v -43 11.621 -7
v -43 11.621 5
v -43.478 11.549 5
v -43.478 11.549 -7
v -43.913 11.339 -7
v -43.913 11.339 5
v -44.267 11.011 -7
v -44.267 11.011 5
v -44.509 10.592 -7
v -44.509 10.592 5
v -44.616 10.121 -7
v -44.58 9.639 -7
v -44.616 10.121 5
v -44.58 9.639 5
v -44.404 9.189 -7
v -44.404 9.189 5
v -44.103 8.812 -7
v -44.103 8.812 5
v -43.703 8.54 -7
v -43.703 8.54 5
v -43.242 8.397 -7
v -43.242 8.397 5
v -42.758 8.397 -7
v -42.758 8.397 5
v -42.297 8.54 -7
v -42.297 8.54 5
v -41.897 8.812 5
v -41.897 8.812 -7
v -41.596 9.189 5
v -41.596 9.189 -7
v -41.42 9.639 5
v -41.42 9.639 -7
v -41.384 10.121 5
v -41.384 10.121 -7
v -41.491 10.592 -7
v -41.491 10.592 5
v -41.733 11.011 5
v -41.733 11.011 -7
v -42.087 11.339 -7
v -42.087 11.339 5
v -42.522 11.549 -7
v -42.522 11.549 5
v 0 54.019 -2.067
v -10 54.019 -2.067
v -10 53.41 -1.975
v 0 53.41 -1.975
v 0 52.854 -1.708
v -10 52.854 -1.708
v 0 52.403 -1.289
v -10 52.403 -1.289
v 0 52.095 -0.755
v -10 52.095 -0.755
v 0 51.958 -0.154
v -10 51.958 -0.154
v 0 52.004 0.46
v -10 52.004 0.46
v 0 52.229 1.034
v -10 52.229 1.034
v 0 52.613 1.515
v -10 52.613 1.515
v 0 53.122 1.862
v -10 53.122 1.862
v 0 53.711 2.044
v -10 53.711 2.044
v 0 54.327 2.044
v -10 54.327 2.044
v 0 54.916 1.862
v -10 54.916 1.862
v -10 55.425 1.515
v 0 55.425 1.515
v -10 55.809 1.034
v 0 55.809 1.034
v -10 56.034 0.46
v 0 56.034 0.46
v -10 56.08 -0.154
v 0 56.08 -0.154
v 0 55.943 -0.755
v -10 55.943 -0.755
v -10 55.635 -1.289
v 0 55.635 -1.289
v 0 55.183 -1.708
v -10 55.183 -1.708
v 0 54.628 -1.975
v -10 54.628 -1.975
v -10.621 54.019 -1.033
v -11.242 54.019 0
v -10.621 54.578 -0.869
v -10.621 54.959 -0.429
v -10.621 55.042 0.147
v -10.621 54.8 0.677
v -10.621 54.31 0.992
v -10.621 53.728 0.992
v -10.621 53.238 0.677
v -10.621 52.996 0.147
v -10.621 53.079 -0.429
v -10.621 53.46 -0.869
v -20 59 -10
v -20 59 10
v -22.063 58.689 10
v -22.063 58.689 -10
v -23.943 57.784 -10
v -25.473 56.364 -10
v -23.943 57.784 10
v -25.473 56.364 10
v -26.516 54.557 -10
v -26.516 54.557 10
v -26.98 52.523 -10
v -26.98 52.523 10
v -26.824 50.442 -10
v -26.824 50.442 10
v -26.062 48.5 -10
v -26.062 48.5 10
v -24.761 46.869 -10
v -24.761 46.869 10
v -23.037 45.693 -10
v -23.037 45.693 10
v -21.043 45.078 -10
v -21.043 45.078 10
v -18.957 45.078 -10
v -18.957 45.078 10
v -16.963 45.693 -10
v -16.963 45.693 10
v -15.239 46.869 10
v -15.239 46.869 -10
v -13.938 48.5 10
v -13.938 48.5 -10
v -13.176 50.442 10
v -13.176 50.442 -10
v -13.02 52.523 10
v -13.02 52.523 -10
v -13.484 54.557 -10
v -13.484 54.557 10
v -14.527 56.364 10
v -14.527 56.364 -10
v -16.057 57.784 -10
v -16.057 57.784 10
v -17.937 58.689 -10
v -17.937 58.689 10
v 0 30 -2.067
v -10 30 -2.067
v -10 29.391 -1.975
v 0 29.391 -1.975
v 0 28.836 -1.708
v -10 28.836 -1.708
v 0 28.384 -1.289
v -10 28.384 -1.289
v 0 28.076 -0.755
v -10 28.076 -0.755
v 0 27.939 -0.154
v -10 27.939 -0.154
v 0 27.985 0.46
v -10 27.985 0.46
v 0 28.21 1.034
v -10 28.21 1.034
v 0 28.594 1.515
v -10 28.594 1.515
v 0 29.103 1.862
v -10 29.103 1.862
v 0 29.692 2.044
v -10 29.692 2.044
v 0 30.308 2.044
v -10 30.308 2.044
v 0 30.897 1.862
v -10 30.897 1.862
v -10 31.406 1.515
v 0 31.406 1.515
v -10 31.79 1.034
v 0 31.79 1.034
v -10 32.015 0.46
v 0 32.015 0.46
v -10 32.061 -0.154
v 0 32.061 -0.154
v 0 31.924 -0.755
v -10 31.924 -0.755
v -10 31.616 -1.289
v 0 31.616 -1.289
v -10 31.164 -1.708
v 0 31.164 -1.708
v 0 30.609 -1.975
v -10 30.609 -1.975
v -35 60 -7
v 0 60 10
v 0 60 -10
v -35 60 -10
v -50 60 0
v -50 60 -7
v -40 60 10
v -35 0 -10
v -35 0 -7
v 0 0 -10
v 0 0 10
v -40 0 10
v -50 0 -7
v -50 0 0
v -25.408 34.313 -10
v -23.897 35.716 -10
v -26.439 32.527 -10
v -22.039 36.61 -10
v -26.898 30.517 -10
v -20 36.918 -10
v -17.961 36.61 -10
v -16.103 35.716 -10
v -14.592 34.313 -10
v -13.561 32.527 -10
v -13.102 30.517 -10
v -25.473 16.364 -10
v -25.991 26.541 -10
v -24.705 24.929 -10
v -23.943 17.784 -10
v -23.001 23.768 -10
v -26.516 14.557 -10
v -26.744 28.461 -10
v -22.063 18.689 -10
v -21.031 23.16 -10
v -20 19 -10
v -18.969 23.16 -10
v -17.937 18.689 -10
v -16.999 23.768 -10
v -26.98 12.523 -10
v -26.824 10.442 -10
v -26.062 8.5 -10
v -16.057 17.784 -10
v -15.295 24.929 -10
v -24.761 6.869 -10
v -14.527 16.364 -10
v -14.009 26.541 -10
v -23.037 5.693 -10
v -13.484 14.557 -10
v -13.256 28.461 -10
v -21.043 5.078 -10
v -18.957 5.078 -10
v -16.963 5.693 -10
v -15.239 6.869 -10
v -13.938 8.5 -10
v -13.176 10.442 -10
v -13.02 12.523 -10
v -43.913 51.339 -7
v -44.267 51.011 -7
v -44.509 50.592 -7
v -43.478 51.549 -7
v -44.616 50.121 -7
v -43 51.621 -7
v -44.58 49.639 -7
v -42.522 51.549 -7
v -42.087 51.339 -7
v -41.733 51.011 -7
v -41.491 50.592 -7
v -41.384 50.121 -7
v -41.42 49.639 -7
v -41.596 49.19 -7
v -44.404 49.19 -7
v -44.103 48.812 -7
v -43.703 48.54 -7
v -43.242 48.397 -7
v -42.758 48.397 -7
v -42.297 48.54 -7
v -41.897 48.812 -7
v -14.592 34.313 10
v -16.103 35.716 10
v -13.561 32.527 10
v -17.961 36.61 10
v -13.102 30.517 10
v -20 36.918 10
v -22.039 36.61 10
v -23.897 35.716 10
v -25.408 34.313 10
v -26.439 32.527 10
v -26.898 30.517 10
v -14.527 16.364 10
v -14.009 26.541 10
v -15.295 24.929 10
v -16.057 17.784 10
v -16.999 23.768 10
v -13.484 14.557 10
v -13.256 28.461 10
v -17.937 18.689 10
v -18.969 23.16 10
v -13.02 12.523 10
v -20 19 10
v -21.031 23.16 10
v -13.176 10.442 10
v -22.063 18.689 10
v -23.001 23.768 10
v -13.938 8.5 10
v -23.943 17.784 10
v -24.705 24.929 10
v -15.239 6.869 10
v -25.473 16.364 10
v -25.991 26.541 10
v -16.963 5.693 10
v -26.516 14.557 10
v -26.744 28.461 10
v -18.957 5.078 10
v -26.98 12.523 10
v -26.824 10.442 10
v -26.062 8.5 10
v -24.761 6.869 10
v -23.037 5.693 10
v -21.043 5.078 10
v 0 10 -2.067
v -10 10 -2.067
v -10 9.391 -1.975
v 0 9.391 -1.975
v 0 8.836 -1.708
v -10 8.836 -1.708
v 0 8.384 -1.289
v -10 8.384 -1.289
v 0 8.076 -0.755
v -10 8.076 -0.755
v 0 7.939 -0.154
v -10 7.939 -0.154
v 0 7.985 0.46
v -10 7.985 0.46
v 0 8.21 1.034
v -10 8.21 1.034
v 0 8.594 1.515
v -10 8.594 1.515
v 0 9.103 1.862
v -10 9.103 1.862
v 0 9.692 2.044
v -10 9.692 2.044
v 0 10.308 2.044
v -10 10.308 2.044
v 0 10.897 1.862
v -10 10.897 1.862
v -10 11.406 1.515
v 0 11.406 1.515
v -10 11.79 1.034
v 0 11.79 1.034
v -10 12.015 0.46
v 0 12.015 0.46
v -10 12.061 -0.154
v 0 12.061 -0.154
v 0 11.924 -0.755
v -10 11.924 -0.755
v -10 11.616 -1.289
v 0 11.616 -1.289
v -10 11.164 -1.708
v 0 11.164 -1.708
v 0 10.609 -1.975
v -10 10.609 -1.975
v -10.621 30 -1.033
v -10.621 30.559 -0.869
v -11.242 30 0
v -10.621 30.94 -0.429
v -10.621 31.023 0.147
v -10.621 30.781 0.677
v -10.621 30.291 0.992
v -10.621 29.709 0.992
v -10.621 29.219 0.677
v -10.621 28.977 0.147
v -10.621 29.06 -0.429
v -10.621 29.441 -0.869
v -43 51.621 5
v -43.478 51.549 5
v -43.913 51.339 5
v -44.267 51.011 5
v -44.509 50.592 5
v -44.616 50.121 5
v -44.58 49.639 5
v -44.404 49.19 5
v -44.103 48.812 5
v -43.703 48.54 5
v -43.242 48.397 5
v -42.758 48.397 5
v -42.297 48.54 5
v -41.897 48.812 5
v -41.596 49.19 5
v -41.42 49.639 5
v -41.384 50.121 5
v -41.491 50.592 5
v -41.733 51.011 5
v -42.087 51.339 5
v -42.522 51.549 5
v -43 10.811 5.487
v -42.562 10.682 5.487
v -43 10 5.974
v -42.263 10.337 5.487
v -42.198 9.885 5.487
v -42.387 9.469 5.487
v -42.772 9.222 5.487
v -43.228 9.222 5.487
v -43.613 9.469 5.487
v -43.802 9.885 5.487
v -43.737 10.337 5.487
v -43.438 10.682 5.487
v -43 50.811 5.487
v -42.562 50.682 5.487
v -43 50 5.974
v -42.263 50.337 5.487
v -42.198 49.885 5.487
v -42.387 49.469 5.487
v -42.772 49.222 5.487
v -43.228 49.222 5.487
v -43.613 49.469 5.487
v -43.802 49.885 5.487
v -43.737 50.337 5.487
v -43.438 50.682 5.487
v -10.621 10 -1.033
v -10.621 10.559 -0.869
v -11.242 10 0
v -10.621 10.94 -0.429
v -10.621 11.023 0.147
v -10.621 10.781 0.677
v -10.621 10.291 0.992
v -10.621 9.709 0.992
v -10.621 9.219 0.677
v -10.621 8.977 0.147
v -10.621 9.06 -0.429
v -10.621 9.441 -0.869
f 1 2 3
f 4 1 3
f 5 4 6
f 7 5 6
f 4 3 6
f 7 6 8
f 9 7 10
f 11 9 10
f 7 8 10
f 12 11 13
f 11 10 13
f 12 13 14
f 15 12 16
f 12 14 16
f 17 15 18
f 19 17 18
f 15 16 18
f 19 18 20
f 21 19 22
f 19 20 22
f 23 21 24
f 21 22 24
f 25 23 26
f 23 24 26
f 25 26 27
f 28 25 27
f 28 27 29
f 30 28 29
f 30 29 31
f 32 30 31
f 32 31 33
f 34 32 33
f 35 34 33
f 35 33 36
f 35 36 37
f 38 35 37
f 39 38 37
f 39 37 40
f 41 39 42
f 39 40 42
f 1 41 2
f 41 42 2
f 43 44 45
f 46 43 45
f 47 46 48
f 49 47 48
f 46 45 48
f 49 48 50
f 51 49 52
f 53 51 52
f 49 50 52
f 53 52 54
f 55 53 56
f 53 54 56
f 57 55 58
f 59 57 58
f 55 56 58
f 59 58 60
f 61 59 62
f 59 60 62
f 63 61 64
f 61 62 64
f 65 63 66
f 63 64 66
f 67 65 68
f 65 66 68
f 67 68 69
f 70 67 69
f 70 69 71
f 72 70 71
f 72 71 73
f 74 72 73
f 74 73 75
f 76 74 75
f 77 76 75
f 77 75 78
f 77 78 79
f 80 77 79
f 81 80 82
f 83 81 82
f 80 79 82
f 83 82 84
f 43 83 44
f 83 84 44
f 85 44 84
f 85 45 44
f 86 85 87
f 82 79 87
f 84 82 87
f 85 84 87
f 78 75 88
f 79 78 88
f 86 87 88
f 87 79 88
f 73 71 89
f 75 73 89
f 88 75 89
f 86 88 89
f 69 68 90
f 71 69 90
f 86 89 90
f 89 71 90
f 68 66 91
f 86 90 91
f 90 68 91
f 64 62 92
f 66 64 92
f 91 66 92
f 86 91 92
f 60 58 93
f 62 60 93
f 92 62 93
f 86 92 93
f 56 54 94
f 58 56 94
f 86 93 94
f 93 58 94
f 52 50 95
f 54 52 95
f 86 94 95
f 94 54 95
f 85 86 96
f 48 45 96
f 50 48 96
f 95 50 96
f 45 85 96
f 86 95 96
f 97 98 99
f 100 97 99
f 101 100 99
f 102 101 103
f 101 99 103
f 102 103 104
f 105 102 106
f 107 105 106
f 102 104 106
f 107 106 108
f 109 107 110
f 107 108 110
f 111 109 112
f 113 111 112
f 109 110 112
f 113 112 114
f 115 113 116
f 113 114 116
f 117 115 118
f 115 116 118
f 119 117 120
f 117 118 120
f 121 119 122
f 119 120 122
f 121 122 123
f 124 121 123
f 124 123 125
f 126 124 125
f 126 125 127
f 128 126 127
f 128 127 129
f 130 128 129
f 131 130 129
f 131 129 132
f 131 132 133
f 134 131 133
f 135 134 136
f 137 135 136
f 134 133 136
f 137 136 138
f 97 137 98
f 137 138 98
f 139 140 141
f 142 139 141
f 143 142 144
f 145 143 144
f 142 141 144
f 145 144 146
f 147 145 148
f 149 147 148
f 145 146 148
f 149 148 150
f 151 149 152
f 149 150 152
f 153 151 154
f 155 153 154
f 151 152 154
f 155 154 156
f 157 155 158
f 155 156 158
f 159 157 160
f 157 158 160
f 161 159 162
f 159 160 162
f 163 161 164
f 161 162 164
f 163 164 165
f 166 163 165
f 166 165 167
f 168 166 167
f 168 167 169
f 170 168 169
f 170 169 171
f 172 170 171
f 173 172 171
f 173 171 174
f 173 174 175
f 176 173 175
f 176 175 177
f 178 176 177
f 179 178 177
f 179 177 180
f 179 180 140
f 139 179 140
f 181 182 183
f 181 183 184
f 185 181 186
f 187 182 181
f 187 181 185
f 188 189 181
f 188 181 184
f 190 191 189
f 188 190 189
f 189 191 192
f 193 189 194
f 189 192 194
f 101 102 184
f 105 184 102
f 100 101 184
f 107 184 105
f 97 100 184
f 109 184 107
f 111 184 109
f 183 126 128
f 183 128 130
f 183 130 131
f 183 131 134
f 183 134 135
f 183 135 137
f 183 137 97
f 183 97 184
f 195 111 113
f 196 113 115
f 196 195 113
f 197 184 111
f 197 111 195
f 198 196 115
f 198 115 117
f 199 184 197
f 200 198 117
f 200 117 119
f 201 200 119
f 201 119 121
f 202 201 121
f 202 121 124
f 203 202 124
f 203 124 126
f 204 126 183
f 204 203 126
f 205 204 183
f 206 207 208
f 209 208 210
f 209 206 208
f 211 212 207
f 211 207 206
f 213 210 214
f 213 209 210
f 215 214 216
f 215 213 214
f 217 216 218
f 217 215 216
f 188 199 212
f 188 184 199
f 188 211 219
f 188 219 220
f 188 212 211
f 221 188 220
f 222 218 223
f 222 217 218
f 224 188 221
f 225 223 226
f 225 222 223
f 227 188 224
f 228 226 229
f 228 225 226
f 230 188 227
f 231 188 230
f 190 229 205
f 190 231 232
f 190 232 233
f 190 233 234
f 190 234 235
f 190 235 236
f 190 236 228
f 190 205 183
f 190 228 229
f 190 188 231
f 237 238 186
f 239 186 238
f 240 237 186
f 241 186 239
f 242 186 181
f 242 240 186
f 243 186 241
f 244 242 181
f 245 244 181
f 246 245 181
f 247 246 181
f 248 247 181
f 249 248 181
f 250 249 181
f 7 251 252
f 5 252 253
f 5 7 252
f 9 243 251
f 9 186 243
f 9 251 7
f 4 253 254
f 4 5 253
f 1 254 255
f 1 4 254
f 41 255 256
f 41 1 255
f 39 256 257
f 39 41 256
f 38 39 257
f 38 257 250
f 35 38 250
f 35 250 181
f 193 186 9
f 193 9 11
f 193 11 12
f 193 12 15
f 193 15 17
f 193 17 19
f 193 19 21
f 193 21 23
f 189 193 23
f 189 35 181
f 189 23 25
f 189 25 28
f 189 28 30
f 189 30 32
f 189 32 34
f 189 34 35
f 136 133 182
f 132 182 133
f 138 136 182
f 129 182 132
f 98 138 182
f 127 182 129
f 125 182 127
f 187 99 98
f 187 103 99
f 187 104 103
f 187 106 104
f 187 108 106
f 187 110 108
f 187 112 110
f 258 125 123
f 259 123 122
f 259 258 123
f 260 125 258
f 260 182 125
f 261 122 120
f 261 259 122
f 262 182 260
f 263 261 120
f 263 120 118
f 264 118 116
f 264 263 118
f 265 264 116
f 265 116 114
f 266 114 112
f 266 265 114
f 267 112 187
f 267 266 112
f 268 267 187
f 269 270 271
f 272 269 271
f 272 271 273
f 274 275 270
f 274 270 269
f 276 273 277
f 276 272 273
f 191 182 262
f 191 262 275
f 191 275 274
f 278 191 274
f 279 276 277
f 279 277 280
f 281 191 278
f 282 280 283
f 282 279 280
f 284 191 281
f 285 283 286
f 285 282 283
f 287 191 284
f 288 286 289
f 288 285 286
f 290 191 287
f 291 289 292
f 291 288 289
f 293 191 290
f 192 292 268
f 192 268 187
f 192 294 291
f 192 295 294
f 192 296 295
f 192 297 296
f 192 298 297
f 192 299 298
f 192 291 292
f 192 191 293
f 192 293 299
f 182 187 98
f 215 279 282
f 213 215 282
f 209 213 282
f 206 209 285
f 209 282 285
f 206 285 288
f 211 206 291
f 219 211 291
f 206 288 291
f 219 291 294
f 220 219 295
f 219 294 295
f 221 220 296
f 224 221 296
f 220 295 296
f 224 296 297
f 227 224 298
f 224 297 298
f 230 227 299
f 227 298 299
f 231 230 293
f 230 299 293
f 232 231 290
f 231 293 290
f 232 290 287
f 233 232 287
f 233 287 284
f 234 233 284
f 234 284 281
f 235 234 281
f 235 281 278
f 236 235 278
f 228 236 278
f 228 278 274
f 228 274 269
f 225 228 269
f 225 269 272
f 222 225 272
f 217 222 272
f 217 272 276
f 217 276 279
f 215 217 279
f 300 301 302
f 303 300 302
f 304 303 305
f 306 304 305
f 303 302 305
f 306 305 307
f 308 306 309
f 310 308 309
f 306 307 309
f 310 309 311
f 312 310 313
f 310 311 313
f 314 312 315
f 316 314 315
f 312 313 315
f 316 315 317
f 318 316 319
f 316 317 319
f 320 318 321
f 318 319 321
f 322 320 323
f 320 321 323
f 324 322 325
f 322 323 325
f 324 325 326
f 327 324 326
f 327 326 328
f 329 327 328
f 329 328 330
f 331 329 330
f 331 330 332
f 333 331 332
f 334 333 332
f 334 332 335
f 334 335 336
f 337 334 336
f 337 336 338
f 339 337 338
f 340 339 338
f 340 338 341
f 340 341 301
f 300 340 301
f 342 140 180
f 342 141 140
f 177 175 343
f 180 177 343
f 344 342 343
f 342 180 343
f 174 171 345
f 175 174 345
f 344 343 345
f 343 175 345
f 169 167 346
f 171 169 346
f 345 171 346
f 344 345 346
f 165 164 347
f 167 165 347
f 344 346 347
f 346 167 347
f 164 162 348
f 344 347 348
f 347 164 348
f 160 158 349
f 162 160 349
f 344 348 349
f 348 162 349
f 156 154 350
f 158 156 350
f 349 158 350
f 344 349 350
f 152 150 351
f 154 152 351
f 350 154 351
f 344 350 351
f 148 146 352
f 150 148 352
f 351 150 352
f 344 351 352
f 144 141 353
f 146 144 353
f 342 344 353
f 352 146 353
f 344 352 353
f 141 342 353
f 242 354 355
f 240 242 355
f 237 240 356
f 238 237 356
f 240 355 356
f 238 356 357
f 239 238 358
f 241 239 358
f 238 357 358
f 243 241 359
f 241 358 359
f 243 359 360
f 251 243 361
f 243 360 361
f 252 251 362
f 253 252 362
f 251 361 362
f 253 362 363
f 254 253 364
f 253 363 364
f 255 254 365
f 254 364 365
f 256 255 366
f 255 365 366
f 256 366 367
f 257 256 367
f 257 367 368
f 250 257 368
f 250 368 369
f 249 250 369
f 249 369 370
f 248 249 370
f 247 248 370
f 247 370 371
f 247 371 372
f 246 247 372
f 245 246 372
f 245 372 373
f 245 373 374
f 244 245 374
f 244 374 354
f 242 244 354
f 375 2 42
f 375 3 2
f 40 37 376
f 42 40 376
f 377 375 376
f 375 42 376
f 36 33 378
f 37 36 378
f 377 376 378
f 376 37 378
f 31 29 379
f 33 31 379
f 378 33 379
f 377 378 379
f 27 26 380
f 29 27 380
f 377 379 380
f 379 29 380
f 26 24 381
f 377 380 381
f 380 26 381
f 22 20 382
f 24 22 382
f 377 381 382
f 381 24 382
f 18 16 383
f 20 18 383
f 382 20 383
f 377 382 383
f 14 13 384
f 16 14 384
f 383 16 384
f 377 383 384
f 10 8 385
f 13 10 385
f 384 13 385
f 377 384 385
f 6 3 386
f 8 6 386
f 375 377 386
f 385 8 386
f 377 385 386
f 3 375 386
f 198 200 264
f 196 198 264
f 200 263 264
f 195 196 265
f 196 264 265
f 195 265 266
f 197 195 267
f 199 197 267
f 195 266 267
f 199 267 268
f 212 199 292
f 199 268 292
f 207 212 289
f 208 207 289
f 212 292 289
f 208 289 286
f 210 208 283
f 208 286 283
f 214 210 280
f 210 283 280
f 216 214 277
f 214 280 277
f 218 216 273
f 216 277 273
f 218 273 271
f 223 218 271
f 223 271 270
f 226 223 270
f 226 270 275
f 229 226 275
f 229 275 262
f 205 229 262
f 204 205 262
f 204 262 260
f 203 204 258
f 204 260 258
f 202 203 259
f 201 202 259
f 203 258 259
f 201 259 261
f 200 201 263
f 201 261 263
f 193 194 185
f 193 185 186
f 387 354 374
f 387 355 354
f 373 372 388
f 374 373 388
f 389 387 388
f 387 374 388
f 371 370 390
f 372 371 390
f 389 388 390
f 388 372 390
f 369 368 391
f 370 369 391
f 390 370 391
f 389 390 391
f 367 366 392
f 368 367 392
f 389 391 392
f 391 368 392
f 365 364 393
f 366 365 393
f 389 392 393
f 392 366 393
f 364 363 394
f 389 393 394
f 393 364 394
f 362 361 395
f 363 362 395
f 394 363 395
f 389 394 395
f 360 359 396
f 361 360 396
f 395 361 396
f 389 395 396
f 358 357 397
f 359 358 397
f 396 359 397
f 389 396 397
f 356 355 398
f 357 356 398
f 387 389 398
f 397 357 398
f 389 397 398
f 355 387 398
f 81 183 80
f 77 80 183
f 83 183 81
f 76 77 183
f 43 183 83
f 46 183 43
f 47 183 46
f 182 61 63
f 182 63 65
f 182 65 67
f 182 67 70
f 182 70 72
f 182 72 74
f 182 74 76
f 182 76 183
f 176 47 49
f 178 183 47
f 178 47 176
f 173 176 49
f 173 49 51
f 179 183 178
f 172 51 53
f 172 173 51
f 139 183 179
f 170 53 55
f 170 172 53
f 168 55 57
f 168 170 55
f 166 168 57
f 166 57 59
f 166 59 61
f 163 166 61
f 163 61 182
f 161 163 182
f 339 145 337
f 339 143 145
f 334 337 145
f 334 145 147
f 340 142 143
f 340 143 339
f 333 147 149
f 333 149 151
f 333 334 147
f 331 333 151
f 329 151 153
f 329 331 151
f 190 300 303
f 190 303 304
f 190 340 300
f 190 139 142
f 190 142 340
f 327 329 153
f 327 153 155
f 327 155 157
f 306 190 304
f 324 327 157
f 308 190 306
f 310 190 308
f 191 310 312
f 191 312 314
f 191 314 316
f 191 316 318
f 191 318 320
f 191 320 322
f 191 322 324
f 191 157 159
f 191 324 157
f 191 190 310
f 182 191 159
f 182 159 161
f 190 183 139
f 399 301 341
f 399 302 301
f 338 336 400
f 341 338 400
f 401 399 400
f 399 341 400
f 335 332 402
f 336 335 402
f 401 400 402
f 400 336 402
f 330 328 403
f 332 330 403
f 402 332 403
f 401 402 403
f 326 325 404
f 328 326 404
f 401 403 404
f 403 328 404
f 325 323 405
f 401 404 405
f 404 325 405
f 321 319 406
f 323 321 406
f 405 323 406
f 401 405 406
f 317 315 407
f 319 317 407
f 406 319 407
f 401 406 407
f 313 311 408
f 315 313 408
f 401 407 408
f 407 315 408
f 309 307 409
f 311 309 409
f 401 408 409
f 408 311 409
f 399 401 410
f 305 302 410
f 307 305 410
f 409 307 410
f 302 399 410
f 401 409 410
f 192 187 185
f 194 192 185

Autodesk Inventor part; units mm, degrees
ref_plane "YZ Plane" through (0, 0, 0) normal (1, 0, 0) x (0, 1, 0)
ref_plane "XZ Plane" through (0, 0, 0) normal (0, 1, 0) x (-1, 0, 0)
ref_plane "XY Plane" through (0, 0, 0) normal (0, 0, 1) x (1, 0, 0)
sketch "Skizze1" plane through (0, 0, 0) normal (0, 1, 0) x (-1, 0, 0)
  line L0 (0, -10) -> (0, 10)
  line L1 (0, 10) -> (40, 10)
  line L2 (40, 10) -> (50, 0)
  line L3 (50, 0) -> (50, -7)
  line L4 (50, -7) -> (35, -7)
  line L5 (35, -7) -> (35, -10)
  line L6 (35, -10) -> (0, -10)
  line L7 (0, 0) -> (85.3703, 0) construction
  dimension "d0" = 10
  dimension "d1" = 10
  dimension "d2" = 3
  dimension "d3" = 20
  dimension "d4" = 40
  dimension "d5" = 15
extrude "Extrusion1" add sketch "Skizze1" along normal blind 60
sketch "Skizze2" plane through (-35, 0, -7) normal (0, 0, -1) x (-1, 0, 0)
  line L0 (15, 0) -> (15, 60) projected
  line L1 (15, 30) -> (5.3736, 30) construction
  line L2 (0, 60) -> (15, 60) projected
  point P0 (-35, 0)
  point P1 (8, 10)
  point P2 (8, 50)
  dimension "d8" = 7
  dimension "d9" = 7
  dimension "d10" = 40
  dimension "d11" = 10
hole "Bohrung1" at (-43, 10, -7) at (-43, 50, -7) direction (0, 0, 1) diameter 3.242 depth 12 tip angle 118 thread size "M4x0.7" class "6H" standard "ISO Metric profile"
sketch "Skizze3" plane through (0, 0, -10) normal (0, 0, -1) x (-1, 0, 0)
  line L0 (0, 0) -> (0, 60) projected
  line L1 (0, 0) -> (35, 0) projected
  point P0 (20, 52)
  point P1 (20, 30)
  point P2 (20, 12)
  point P3 (0, 30)
  dimension "d19" = 20
  dimension "d20" = 12
  dimension "d21" = 40
hole "Bohrung2" at (-20, 12, -10) at (-20, 52, -10) direction (0, 0, 1) diameter 14 depth 20
hole "Bohrung3" at (-20, 30, -10) direction (0, 0, 1) diameter 13.835 depth 20 thread size "M16x2" class "6H" standard "ISO Metric profile"
sketch "Skizze6" plane through (0, 0, 10) normal (1, 0, 0) x (0, 0, -1)
  line L0 (0, 60) -> (20, 60) projected
  point P0 (10, 0)
  point P1 (10, 54.0188)
  point P2 (10, 60)
hole "Bohrung4" at (0, 54.0188, 0) direction (-1, 0, 0) diameter 4.134 depth 10 tip angle 118 thread size "M5x0.8" class "6H" standard "ISO Metric profile"
sketch "Skizze7" plane through (0, 0, 10) normal (1, 0, 0) x (0, 0, -1)
  line L0 (0, 0) -> (20, 0) projected
  point P0 (10, 0)
  point P1 (10, 10)
  point P2 (10, 0)
  point P3 (10, 0)
  dimension "d51" = 10
hole "Bohrung5" at (0, 10, 0) direction (-1, 0, 0) diameter 4.134 depth 10 tip angle 118 thread size "M5x0.8" class "6H" standard "ISO Metric profile"
sketch "Skizze8" plane through (0, 0, 10) normal (1, 0, 0) x (0, 0, -1)
  line L0 (0, 0) -> (20, 0) projected
  point P0 (10, 0)
  point P1 (10, 30)
  point P2 (10, 0)
  point P3 (10, 0)
  point P4 (10, 0)
  dimension "d59" = 30
hole "Bohrung6" at (0, 30, 0) direction (-1, 0, 0) diameter 4.134 depth 10 tip angle 118 thread size "M5x0.8" class "6H" standard "ISO Metric profile"
properties part number "spannbakce"
